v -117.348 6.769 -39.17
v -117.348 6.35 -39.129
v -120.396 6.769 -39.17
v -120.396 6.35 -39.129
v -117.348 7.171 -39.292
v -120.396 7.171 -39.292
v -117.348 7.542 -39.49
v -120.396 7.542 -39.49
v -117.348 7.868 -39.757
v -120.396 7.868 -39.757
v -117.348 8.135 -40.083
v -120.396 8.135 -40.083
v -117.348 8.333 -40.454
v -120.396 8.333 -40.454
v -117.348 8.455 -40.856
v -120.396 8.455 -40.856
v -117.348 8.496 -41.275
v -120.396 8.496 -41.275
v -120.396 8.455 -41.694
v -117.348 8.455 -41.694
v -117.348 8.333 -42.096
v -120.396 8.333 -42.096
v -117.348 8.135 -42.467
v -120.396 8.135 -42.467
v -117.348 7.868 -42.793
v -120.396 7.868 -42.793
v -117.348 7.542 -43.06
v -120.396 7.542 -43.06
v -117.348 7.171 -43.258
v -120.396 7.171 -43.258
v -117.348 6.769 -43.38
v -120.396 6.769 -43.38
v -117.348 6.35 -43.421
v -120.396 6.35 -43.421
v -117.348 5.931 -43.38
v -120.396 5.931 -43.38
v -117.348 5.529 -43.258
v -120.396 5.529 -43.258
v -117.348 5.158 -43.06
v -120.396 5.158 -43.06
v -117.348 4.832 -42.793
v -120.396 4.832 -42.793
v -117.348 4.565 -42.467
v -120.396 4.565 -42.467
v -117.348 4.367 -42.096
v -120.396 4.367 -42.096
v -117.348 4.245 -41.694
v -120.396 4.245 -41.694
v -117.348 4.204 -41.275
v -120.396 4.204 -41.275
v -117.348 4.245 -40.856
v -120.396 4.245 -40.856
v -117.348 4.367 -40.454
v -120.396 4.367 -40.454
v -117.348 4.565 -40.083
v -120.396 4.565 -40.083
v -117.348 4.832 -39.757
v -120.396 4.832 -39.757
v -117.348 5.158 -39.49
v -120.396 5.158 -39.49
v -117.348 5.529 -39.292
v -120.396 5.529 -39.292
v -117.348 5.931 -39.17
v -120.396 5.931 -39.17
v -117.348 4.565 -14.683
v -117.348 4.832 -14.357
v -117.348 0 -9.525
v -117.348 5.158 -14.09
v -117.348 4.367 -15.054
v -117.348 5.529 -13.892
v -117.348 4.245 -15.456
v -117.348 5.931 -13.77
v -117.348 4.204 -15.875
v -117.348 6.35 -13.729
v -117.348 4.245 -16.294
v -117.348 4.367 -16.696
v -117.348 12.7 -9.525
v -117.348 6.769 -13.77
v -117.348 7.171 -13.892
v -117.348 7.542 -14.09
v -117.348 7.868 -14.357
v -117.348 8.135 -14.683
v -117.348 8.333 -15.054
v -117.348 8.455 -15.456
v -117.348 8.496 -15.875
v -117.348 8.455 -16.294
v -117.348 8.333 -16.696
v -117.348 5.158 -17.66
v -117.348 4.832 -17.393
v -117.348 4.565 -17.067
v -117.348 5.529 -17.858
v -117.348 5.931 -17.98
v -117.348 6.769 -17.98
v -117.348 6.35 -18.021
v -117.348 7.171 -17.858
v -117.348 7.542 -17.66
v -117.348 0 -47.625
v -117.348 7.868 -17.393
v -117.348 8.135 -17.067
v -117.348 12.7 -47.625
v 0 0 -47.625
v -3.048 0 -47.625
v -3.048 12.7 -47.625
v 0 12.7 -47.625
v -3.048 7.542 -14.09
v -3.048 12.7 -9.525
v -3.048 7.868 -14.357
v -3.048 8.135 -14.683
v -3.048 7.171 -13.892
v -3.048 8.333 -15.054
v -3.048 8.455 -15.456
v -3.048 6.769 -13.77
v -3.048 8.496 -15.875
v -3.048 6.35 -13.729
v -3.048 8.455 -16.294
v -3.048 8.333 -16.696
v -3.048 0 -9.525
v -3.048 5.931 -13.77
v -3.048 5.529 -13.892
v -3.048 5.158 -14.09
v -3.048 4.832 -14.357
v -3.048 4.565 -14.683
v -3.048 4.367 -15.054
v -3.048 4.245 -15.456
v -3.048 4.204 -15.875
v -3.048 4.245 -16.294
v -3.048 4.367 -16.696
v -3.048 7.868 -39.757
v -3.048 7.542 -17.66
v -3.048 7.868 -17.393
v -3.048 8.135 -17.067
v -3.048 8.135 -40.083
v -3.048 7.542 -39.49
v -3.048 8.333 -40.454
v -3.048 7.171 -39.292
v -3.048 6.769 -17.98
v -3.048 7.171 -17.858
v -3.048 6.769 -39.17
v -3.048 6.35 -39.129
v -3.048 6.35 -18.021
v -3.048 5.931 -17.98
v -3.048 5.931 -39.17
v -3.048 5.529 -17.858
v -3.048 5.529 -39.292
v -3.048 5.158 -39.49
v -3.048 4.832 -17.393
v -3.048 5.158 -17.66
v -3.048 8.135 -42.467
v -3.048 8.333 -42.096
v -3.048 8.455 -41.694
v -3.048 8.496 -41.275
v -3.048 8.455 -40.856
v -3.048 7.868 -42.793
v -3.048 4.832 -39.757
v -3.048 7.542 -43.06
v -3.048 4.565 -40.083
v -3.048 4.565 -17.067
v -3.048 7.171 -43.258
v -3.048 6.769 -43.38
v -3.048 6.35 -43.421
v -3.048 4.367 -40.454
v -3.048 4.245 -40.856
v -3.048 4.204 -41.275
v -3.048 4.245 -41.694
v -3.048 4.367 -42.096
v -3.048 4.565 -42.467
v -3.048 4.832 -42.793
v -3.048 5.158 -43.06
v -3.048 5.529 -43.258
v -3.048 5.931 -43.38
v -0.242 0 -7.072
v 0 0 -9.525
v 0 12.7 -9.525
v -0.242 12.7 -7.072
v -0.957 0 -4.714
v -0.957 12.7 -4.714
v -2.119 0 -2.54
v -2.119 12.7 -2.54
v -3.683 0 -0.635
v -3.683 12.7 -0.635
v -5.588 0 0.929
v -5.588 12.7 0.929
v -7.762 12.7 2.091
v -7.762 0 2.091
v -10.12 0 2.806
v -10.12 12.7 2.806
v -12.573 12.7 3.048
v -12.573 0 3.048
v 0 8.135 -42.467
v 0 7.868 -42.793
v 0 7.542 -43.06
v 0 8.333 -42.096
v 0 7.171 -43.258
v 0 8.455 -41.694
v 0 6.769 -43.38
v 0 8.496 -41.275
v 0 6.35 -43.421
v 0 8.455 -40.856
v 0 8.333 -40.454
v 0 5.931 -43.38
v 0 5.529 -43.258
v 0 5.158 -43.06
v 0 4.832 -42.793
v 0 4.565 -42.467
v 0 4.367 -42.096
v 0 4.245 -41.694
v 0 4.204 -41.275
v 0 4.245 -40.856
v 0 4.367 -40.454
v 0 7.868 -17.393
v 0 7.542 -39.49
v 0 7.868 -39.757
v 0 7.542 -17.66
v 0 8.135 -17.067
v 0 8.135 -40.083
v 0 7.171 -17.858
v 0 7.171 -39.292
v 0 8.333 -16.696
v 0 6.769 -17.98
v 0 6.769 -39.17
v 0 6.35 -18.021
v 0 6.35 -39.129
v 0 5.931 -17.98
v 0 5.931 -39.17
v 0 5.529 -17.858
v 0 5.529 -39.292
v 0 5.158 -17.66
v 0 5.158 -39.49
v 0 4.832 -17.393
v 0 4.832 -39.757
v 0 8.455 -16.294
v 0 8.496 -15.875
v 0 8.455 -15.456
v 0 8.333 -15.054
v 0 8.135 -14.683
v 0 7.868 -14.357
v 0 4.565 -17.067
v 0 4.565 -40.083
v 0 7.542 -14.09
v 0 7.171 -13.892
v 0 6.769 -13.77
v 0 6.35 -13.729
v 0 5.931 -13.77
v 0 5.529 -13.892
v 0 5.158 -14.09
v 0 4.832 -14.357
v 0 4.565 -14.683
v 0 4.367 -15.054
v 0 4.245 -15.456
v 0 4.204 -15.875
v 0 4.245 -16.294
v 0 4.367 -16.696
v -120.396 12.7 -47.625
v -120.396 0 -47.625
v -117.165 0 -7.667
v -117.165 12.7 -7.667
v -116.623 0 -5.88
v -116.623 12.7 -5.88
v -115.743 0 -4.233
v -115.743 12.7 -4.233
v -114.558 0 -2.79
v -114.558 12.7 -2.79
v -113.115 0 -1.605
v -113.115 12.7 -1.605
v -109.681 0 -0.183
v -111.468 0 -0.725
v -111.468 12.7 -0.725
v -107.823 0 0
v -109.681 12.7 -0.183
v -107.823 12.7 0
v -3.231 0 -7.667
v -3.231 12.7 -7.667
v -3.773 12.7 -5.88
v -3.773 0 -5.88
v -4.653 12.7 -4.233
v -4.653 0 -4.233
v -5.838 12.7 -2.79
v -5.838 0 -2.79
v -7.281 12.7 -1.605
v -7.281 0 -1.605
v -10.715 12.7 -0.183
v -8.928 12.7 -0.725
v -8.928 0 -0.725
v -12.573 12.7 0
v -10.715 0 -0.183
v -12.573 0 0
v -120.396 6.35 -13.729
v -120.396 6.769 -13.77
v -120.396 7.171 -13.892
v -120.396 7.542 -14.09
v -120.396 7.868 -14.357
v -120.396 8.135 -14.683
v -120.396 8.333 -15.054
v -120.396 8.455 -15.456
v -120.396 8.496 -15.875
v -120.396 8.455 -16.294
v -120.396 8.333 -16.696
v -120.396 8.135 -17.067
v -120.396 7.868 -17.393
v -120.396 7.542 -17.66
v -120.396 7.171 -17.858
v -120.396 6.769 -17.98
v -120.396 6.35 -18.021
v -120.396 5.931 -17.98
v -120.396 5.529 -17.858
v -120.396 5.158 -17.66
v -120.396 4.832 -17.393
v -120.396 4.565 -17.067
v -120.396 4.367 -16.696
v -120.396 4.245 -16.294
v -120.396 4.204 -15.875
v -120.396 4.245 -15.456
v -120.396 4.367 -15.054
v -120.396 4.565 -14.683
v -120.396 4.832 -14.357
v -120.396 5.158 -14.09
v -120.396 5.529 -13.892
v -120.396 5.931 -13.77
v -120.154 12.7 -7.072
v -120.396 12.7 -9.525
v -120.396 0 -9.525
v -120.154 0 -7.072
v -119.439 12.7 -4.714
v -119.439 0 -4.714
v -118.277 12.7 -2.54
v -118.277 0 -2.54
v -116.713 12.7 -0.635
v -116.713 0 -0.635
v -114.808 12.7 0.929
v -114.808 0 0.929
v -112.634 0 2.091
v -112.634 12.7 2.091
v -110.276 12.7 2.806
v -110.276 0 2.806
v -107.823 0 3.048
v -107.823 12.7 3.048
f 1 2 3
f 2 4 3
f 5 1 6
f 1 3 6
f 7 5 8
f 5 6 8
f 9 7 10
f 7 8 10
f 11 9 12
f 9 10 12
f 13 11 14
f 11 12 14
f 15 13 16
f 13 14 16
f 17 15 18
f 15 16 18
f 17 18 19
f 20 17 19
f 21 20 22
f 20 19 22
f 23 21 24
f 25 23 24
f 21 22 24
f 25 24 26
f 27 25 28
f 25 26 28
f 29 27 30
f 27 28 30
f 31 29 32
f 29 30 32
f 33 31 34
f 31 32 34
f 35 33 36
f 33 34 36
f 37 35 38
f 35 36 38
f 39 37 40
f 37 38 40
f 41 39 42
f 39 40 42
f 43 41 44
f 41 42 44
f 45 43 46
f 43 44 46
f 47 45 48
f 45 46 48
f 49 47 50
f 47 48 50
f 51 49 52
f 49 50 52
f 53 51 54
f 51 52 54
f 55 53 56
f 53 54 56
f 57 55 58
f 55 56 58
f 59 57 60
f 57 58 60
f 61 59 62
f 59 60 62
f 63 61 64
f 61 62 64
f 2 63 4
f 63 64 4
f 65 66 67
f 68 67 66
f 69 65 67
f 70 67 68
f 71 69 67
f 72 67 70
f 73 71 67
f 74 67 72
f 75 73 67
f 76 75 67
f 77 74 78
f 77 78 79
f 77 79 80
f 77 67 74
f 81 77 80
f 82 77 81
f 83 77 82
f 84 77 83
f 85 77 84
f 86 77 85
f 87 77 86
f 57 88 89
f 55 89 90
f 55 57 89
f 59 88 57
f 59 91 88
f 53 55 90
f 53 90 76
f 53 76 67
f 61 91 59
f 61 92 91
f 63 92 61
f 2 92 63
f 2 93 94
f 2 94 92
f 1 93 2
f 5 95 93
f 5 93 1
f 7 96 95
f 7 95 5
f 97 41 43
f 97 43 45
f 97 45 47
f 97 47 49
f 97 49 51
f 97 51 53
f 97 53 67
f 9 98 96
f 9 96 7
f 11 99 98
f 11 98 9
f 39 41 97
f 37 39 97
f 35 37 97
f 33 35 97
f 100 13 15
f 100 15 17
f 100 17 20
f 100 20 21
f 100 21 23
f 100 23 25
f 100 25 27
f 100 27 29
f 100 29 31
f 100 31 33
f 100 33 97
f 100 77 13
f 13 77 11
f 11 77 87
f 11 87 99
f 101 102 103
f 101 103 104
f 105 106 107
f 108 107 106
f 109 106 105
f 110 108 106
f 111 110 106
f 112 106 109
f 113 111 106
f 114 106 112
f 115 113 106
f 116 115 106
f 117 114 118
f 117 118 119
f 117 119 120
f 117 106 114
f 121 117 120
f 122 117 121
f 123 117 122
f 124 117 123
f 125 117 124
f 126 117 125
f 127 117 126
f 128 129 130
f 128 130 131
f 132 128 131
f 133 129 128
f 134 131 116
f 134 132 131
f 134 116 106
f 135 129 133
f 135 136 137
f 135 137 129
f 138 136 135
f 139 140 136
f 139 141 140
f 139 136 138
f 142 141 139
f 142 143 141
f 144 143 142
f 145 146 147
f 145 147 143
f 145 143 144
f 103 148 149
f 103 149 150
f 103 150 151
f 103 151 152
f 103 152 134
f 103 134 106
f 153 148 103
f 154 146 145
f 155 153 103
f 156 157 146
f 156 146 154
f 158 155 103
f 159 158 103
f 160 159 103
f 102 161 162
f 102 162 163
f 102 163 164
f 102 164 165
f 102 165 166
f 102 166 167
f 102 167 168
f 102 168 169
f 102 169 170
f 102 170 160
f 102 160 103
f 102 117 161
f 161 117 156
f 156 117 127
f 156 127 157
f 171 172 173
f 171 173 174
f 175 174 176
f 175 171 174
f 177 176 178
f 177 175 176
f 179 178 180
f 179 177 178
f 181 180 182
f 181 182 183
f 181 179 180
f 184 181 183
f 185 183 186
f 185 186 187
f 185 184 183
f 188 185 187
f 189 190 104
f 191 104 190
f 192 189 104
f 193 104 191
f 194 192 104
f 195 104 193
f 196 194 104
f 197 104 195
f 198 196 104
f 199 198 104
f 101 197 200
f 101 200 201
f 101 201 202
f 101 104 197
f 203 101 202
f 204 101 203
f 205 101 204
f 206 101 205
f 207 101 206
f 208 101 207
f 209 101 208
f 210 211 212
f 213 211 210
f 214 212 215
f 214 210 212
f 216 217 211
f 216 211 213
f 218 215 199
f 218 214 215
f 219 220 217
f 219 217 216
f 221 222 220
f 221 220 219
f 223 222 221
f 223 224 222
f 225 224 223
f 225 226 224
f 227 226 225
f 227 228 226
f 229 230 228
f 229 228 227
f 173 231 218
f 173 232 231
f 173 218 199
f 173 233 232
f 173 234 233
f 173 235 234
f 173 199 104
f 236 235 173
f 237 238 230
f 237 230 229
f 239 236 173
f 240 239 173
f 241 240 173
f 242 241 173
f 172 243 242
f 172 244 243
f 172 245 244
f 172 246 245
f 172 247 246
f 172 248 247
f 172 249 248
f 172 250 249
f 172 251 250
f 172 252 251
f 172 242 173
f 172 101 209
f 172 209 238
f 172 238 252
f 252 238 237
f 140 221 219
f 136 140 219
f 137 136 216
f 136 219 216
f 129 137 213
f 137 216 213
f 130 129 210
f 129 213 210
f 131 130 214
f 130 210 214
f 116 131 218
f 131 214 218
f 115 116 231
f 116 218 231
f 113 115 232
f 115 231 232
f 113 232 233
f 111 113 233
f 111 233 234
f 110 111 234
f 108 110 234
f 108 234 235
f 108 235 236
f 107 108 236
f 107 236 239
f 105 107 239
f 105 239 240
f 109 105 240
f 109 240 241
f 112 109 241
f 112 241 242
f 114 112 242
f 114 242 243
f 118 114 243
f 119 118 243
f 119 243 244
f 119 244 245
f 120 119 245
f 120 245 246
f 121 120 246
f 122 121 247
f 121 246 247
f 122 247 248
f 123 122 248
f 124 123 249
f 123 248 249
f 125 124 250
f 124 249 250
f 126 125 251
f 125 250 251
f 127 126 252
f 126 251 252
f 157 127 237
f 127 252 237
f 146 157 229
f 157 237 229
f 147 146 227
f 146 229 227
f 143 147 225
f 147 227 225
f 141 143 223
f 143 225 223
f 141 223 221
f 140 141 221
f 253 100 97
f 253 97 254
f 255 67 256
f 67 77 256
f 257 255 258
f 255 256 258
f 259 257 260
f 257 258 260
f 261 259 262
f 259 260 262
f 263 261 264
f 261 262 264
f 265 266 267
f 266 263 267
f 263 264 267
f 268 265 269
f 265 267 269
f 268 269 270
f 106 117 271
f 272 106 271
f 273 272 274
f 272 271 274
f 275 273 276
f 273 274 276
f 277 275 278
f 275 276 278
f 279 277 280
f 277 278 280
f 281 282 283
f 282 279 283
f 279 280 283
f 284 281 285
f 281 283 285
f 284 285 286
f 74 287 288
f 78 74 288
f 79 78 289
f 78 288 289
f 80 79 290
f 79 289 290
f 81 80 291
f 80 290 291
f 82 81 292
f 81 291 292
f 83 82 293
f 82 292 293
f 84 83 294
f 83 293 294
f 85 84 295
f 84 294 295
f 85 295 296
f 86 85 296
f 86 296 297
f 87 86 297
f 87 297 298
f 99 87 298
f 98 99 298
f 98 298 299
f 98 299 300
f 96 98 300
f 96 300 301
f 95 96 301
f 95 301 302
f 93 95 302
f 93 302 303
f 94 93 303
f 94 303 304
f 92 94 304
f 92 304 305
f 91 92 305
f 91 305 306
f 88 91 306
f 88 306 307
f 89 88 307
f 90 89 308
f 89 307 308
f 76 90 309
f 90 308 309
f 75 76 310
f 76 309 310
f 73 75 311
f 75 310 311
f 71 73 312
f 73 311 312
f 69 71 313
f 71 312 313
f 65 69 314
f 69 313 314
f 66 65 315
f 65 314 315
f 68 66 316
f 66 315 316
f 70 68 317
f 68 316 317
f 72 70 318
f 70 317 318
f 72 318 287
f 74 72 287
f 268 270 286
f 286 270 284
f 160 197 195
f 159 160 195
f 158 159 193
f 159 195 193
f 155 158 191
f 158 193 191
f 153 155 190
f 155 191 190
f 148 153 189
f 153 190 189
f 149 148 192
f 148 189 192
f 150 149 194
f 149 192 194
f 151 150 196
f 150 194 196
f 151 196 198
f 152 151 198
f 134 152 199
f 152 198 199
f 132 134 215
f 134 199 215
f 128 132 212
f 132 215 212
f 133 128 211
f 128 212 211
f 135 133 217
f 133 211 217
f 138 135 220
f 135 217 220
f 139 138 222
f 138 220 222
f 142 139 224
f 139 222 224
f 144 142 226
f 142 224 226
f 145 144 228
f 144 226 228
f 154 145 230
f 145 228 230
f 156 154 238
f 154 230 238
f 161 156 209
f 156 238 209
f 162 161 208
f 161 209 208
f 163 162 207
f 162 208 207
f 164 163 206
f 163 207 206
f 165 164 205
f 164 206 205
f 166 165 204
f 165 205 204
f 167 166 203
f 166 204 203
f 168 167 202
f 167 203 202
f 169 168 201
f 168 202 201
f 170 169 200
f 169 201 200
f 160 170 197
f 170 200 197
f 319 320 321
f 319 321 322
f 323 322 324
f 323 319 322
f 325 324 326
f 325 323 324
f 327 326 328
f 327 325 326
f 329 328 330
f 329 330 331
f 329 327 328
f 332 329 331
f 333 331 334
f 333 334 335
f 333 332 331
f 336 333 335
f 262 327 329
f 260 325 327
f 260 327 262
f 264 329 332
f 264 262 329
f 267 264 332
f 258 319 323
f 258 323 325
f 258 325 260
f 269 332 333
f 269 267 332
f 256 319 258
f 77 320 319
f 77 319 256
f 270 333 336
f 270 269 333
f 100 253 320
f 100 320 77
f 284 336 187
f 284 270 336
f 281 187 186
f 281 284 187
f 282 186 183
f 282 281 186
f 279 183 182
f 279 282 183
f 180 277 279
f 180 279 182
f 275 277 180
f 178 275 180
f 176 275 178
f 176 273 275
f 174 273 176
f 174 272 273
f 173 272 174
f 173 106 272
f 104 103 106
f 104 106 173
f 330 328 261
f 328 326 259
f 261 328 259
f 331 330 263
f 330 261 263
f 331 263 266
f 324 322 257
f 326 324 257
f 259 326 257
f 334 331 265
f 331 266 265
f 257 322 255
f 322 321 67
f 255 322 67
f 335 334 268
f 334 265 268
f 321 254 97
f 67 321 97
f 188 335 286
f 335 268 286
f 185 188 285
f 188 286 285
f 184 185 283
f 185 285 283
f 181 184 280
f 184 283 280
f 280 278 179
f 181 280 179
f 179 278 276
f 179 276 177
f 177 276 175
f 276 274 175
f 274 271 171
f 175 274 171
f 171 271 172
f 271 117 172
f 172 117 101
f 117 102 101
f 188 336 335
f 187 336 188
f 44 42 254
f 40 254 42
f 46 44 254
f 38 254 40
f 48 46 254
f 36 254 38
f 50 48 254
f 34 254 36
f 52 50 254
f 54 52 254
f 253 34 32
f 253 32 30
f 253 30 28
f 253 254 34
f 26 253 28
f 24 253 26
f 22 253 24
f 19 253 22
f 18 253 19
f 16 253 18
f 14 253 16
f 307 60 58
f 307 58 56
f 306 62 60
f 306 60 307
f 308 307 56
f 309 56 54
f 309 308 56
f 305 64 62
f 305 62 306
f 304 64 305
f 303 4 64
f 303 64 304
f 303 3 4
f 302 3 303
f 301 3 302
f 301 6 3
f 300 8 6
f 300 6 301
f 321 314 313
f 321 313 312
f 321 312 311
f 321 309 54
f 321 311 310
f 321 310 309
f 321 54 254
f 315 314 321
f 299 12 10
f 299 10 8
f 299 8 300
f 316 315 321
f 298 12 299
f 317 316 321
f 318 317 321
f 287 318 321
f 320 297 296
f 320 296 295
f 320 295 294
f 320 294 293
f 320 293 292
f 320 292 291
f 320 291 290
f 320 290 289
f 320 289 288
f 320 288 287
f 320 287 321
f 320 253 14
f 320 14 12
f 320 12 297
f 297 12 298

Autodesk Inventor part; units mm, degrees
ref_plane "YZ Plane" through (0, 0, 0) normal (1, 0, 0) x (0, 1, 0)
ref_plane "XZ Plane" through (0, 0, 0) normal (0, 1, 0) x (-1, 0, 0)
ref_plane "XY Plane" through (0, 0, 0) normal (0, 0, 1) x (1, 0, 0)
sketch "Sketch1" plane through (0, 0, 0) normal (0, 0, 1) x (1, 0, 0)
  line L0 (0, 0) -> (-120.396, 0)
  line L1 (-120.396, 0) -> (-120.396, 12.7)
  line L2 (-120.396, 12.7) -> (0, 12.7)
  line L3 (0, 12.7) -> (0, 0)
  dimension "d0" = 120.396
  dimension "d1" = 12.7
extrude "Plate1" add sketch "Sketch1" along normal blind 3.048
sketch "Sketch2" plane through (-3.048, 0, 3.048) normal (1, 0, 0) x (0, 1, 0)
  line L0 (12.7, 0) -> (0, 0)
  line L1 (0, 0) -> (0, -50.673)
  line L2 (0, -50.673) -> (12.7, -50.673)
  line L3 (12.7, -50.673) -> (12.7, 0)
edge flange "Flange1" height 47.625 angle 90 thickness 3.048 bend radius 9.525 thickness toward (1, 0, 0) relief tear relief width 3.048 relief depth 1.524 edges at (0, 6.35, 0) wall of the first edge with corners at (-3.048, 12.7, 3.048) (-3.048, 0, 3.048) (-3.048, 0, -47.625) (-3.048, 12.7, -47.625)
bend "Bend1"
corner "Corner1"
sketch "Sketch3" plane through (-117.348, 12.7, 3.048) normal (-1, 0, 0) x (0, -1, 0)
  line L0 (12.7, 0) -> (0, 0)
  line L1 (0, 0) -> (0, -50.673)
  line L2 (0, -50.673) -> (12.7, -50.673)
  line L3 (12.7, -50.673) -> (12.7, 0)
edge flange "Flange2" height 47.625 angle 90 thickness 3.048 bend radius 9.525 thickness toward (-1, 0, 0) relief tear relief width 3.048 relief depth 1.524 edges at (-120.396, 6.35, 0) wall of the first edge with corners at (-117.348, 0, 3.048) (-117.348, 12.7, 3.048) (-117.348, 12.7, -47.625) (-117.348, 0, -47.625)
bend "Bend2"
corner "Corner2"
sketch "Sketch4" plane through (0, 0, -47.625) normal (1, 0, 0) x (0, 0, -1)
  line L0 (0, 0) -> (-38.1, 0) projected
  line L1 (0, 12.7) -> (0, 0) projected
  line L2 (-38.1, 12.7) -> (0, 12.7) projected
  line L3 (0, 6.35) -> (-6.35, 6.35)
  line L4 (-6.35, 6.35) -> (-31.75, 6.35)
  circle A0 centre (-31.75, 6.35) radius 2.1463
  circle A1 centre (-6.35, 6.35) radius 2.1463
  point P0 (-47.625, 0)
  dimension "d23" = 6.35
  dimension "d24" = 25.4
  dimension "d25" = 4.2926
  dimension "d26" = 4.2926
extrude "Cut1" cut sketch "Sketch4" against normal blind 3.048
sketch "Sketch5" plane through (-120.396, 0, -47.625) normal (-1, 0, 0) x (0, 0, 1)
  line L0 (0, 0) -> (0, 12.7) projected
  line L1 (38.1, 0) -> (0, 0) projected
  line L2 (0, 6.35) -> (6.35, 6.35)
  line L3 (6.35, 6.35) -> (31.75, 6.35)
  circle A0 centre (6.35, 6.35) radius 2.1463
  circle A1 centre (31.75, 6.35) radius 2.1463
  point P0 (47.625, 0)
  dimension "d29" = 6.35
  dimension "d30" = 25.4
  dimension "d31" = 4.2926
  dimension "d32" = 4.2926
extrude "Cut2" cut sketch "Sketch5" against normal blind 3.048
equation "\"d27\" = Thickness"
equation "\"d33\" = Thickness"
equation "\"d3\" = BendReliefWidth"
equation "\"d4\" = BendReliefDepth"
equation "\"d5\" = MinimumRemnant"
equation "\"d6\" = BendRadius"
equation "\"d10\" = CornerReliefSize"
equation "\"d11\" = GapSize"
equation "\"d12\" = JacobiRadiusSize"
equation "\"d13\" = BendReliefWidth"
equation "\"d14\" = BendReliefDepth"
equation "\"d15\" = MinimumRemnant"
equation "\"d16\" = BendRadius"
equation "\"d20\" = CornerReliefSize"
equation "\"d21\" = GapSize"
equation "\"d22\" = JacobiRadiusSize"
equation "\"BendRadius\" = Thickness"
equation "\"BendReliefWidth\" = Thickness"
equation "\"BendReliefDepth\" = 0.5 * Thickness"
equation "\"CornerReliefSize\" = 4 * Thickness"
equation "\"MinimumRemnant\" = 2 * Thickness"
equation "\"TransitionRadius\" = BendRadius"
equation "\"JacobiRadiusSize\" = BendRadius"
equation "\"GapSize\" = Thickness"
equation "\"d2\" = BendRadius"
equation "\"Thickness\" = 3.048"
properties part number "Generic brace"
